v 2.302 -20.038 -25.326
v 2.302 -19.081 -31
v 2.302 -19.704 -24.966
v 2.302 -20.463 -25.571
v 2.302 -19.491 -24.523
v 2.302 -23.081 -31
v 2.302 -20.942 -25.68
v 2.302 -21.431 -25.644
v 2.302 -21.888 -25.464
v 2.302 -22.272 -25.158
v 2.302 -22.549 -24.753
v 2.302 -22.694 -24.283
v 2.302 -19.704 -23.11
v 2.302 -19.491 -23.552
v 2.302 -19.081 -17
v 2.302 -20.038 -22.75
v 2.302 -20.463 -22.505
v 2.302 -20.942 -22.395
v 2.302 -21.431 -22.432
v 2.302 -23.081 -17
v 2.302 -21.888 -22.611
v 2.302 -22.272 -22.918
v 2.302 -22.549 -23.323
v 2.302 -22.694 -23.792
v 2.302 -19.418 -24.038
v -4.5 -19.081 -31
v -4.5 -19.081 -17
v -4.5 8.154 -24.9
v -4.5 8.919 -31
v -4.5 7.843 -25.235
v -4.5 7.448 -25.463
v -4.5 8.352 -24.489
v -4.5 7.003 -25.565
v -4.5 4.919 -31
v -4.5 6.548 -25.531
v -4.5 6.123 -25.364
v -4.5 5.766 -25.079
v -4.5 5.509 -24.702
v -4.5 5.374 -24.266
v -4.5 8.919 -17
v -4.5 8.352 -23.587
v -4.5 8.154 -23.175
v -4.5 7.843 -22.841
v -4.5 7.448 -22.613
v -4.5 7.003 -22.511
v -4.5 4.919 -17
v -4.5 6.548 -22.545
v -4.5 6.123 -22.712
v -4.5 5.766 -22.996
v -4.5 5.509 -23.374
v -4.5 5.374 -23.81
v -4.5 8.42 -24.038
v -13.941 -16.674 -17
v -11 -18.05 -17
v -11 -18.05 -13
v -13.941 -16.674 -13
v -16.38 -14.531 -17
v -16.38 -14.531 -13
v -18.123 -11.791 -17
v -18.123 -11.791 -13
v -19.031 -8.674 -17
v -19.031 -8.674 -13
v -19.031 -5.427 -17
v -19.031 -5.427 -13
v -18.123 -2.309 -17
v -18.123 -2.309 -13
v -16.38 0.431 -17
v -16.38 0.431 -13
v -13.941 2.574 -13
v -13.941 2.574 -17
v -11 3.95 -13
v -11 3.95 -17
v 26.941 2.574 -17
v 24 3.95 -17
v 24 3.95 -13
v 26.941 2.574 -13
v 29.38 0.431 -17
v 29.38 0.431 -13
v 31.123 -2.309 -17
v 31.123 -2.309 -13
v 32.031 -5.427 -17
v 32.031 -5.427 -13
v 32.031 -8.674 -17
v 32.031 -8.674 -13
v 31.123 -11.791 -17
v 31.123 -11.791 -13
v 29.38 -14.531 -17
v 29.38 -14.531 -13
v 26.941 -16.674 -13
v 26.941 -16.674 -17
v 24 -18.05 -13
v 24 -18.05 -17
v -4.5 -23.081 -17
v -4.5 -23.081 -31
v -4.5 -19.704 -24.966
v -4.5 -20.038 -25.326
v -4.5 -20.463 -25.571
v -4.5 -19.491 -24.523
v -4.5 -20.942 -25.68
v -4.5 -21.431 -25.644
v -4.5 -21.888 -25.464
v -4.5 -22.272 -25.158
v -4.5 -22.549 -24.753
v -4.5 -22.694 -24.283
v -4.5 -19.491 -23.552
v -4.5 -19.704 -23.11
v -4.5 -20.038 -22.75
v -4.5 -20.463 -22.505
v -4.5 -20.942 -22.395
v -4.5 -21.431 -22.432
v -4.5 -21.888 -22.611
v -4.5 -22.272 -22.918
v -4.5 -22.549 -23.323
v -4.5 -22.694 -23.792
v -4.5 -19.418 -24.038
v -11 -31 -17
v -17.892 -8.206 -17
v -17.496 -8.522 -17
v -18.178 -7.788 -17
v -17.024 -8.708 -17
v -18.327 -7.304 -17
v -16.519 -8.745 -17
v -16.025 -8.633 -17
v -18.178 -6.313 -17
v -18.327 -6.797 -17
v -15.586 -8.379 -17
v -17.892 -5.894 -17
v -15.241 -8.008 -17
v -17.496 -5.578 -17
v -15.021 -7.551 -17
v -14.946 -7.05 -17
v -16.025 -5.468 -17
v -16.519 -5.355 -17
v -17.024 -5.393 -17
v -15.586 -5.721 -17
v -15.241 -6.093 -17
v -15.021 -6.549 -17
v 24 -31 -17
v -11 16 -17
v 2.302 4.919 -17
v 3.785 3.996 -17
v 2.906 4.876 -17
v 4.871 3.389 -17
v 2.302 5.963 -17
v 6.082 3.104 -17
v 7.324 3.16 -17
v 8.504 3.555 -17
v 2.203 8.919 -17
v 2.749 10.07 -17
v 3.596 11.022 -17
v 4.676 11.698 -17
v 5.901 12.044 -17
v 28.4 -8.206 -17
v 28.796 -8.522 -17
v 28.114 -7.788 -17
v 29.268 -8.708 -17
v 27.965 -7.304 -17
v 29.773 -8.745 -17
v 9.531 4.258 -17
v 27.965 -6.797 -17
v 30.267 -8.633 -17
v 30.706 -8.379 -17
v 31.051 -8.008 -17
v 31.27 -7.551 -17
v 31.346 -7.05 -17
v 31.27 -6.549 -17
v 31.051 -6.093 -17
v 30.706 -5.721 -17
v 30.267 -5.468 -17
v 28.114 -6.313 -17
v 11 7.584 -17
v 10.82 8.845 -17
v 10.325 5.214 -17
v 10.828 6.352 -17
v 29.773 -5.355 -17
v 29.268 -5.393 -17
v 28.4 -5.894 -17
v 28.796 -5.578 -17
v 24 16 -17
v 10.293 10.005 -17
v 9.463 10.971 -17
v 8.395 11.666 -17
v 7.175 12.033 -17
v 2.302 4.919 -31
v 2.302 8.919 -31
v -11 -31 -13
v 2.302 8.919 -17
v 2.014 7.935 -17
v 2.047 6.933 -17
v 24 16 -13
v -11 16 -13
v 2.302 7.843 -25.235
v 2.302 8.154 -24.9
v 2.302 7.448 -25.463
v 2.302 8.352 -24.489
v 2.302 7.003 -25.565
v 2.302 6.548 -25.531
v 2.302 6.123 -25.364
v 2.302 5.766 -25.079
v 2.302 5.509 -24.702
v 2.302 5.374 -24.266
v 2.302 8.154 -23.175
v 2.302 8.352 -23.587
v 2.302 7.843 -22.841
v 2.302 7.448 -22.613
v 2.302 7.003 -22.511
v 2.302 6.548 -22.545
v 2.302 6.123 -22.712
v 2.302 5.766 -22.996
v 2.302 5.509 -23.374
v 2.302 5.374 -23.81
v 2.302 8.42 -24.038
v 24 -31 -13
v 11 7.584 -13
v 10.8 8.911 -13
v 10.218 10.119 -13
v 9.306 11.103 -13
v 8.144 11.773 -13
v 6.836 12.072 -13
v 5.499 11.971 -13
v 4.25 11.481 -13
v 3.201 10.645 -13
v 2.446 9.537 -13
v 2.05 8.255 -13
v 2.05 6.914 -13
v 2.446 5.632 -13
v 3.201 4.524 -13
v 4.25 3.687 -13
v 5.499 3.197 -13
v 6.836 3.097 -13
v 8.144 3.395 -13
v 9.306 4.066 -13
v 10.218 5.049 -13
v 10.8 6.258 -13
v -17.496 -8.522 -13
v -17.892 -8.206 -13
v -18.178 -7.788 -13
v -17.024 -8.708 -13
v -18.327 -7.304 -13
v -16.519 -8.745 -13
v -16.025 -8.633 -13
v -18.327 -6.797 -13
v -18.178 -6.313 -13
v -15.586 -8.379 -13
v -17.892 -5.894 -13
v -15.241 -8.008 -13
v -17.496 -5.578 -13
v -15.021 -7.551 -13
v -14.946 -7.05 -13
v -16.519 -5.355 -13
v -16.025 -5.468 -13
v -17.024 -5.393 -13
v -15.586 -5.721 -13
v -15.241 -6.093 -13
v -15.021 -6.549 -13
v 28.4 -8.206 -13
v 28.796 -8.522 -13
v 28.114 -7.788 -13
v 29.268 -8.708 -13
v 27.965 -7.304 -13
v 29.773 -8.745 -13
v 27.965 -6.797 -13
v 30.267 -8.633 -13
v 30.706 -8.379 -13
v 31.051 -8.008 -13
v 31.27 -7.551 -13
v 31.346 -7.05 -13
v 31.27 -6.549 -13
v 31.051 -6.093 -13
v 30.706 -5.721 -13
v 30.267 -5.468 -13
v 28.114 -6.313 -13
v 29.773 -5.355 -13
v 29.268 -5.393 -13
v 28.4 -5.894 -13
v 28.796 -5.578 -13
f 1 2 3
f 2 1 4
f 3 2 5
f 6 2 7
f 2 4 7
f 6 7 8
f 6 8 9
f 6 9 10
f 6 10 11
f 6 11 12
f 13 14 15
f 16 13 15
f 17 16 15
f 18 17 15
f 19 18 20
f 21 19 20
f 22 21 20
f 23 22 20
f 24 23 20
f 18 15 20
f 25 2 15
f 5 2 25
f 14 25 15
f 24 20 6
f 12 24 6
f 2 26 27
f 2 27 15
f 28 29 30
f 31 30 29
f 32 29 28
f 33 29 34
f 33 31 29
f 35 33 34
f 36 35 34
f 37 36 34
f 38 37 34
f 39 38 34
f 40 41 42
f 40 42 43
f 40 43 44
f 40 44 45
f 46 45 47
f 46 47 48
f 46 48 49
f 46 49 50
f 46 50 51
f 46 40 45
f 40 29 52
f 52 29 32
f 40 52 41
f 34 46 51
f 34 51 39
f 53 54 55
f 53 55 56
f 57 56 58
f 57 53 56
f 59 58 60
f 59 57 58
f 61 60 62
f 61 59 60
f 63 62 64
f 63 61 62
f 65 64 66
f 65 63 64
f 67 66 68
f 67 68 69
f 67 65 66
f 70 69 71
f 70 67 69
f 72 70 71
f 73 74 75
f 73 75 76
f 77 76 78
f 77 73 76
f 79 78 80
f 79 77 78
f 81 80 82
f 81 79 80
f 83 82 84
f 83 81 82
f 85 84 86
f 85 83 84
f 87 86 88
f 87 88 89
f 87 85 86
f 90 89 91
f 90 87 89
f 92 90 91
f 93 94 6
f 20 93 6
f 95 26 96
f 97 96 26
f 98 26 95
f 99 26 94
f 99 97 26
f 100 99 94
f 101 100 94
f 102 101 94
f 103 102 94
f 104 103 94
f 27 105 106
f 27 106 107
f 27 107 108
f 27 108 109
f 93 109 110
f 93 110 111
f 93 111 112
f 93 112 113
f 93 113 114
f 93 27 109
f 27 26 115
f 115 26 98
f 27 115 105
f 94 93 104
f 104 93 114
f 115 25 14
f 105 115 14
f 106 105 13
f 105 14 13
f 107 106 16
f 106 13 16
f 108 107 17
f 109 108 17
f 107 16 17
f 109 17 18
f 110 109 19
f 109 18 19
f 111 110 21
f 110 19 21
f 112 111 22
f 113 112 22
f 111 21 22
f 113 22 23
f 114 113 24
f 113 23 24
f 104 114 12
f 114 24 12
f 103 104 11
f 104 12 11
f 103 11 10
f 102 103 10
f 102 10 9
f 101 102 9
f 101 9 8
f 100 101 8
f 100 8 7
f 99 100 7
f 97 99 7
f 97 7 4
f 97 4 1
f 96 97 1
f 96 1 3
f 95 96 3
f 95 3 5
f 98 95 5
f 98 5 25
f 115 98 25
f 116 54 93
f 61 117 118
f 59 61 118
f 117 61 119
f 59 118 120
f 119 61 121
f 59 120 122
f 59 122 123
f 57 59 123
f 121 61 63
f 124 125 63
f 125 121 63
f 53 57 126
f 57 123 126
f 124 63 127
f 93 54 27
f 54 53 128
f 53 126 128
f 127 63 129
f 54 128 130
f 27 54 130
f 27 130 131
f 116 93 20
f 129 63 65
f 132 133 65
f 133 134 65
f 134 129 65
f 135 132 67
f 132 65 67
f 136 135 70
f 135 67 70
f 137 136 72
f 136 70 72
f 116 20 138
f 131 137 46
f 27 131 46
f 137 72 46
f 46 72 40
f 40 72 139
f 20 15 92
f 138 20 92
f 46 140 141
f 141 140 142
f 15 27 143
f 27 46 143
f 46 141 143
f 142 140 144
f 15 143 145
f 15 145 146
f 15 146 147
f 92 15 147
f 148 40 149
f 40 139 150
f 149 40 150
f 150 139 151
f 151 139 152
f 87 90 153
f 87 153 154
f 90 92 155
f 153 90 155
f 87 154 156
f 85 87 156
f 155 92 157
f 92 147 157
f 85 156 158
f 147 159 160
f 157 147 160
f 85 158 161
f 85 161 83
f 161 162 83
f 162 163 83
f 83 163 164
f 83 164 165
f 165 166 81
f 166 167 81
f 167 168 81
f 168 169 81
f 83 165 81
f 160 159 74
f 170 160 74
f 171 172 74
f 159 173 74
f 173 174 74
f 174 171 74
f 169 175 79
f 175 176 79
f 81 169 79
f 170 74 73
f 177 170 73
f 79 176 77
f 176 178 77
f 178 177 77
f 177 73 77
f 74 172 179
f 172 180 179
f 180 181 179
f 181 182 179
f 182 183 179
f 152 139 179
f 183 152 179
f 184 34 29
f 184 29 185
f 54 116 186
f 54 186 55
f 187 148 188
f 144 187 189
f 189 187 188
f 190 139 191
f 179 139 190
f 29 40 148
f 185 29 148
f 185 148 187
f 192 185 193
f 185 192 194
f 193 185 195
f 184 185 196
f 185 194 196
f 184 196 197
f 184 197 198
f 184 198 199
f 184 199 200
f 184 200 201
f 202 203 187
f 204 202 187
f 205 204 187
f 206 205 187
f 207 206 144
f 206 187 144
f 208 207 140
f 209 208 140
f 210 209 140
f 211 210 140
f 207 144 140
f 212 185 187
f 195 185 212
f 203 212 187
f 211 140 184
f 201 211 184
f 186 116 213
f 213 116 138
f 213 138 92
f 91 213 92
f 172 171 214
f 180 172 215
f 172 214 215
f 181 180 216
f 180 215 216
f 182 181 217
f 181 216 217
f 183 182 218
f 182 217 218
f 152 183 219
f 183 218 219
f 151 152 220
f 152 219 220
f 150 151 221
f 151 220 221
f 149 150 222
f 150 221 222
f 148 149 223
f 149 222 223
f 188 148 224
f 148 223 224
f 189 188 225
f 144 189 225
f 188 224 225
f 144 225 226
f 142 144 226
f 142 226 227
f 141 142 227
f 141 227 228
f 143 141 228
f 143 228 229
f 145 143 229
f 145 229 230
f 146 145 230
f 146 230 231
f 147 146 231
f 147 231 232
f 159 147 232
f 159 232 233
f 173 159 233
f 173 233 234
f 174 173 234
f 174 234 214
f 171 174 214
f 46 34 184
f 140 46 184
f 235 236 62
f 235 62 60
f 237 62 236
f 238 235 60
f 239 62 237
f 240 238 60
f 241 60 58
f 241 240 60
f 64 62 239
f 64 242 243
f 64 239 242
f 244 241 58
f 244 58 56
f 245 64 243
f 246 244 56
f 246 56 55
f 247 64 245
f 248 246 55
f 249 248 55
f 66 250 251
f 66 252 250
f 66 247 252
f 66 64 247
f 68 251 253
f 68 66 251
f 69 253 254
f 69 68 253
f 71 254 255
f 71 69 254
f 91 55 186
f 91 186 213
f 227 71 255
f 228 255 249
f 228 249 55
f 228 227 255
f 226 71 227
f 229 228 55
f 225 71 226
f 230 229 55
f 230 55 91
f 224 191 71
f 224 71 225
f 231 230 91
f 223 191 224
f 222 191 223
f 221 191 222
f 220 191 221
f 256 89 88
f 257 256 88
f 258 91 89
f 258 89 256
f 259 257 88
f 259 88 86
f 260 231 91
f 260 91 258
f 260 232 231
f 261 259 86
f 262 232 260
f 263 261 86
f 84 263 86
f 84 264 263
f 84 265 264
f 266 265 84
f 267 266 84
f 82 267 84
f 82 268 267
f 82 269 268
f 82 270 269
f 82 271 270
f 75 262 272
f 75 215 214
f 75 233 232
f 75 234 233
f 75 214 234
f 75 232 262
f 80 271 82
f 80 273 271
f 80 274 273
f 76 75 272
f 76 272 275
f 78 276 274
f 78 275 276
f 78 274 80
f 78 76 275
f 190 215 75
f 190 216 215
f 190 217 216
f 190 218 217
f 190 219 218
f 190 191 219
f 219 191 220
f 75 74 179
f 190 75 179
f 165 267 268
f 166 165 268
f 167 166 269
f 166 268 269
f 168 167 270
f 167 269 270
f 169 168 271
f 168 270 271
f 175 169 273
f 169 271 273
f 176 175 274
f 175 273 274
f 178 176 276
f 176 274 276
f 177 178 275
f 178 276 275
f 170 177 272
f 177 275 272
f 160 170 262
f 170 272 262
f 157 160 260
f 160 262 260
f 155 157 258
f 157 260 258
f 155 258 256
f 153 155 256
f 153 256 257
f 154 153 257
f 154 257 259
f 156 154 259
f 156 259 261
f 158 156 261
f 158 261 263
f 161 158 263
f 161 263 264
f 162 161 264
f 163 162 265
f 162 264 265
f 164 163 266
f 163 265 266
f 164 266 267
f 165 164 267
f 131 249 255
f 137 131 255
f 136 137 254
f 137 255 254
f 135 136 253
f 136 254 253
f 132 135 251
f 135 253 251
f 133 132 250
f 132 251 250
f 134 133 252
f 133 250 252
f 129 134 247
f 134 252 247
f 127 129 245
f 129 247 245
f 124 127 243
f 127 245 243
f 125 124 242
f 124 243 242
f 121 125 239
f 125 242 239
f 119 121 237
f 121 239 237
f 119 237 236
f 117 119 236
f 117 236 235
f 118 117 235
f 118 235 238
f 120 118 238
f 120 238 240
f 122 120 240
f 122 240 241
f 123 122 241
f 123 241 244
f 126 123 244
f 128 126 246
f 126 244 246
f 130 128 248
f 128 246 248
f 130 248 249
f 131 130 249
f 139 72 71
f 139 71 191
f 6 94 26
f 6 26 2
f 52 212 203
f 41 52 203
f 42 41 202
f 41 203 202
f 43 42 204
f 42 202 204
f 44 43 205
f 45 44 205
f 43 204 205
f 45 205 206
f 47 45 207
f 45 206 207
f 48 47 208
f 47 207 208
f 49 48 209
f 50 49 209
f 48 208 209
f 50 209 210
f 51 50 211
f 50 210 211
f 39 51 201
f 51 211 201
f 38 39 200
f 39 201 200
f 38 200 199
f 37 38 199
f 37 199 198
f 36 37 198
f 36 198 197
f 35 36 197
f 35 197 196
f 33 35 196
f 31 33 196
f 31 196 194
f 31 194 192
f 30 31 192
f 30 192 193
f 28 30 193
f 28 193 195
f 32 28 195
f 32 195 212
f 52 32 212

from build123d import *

# Parameters (mm, degrees)
BOX001_W        = 35
BOX001_H        = 47
BOX001_DEPTH    = 4
SKETCH006_W     = 6.802042
SKETCH006_H     = 4
PAD003_DEPTH    = 14
SKETCH007_R     = 1.647159
SKETCH007_R_2   = 1.531135
POCKET003_DEPTH = 7
PAD004_DEPTH    = 4
SKETCH009_R     = 4.5
SKETCH009_R_2   = 1.7
POCKET004_DEPTH = 4


with BuildPart() as part:
    # Box001 → Box001 (new body)
    with BuildSketch(Plane(origin=(-11, -31, -17), x_dir=(1, 0, 0), z_dir=(0, 0, 1))):
        with Locations((17.5, 23.5)):
            Rectangle(BOX001_W, BOX001_H)
    extrude(amount=BOX001_DEPTH)

    # Sketch006 → Pad003 (new body)
    with BuildSketch(Plane(origin=(-11, -31, -17), x_dir=(1, 0, 0), z_dir=(0, 0, -1))):
        with Locations((9.901021, -9.91944)):
            Rectangle(SKETCH006_W, SKETCH006_H)
        with Locations((9.901021, -37.91944)):
            Rectangle(SKETCH006_W, SKETCH006_H)
    extrude(amount=PAD003_DEPTH)

    # Sketch007 → Pocket003 (cut)
    with BuildSketch(Plane(origin=(2.302042, -31, -17), x_dir=(0, 1, 0), z_dir=(1, 0, 0))):
        with Locations((9.935232, -7.037912)):
            Circle(SKETCH007_R)
        with Locations((37.888477, -7.037912)):
            Circle(SKETCH007_R_2)
    extrude(amount=-POCKET003_DEPTH, mode=Mode.SUBTRACT)

    # Sketch008 → Pad004 (new body)
    with BuildSketch(Plane(origin=(-11, -31, -17), x_dir=(1, 0, 0), z_dir=(0, 0, -1))):
        with BuildLine():
            ThreePointArc((35, -34.9498), (43.145898, -23.9498), (35, -12.9498))
            Line((35, -12.9498), (35, -34.9498))
        make_face()
        with BuildLine():
            ThreePointArc((0, -12.9498), (-8.145898, -23.9498), (0, -34.9498))
            Line((0, -12.9498), (0, -34.9498))
        make_face()
    extrude(amount=-PAD004_DEPTH)

    # Sketch009 → Pocket004 (cut)
    with BuildSketch(Plane(origin=(-11, -31, -13), x_dir=(1, 0, 0), z_dir=(0, 0, 1))):
        with Locations((17.5, 38.5843)):
            Circle(SKETCH009_R)
        with Locations((-5.645898, 23.9498)):
            Circle(SKETCH009_R_2)
        with Locations((40.645898, 23.9498)):
            Circle(SKETCH009_R_2)
    extrude(amount=-POCKET004_DEPTH, mode=Mode.SUBTRACT)


solid = part.part
